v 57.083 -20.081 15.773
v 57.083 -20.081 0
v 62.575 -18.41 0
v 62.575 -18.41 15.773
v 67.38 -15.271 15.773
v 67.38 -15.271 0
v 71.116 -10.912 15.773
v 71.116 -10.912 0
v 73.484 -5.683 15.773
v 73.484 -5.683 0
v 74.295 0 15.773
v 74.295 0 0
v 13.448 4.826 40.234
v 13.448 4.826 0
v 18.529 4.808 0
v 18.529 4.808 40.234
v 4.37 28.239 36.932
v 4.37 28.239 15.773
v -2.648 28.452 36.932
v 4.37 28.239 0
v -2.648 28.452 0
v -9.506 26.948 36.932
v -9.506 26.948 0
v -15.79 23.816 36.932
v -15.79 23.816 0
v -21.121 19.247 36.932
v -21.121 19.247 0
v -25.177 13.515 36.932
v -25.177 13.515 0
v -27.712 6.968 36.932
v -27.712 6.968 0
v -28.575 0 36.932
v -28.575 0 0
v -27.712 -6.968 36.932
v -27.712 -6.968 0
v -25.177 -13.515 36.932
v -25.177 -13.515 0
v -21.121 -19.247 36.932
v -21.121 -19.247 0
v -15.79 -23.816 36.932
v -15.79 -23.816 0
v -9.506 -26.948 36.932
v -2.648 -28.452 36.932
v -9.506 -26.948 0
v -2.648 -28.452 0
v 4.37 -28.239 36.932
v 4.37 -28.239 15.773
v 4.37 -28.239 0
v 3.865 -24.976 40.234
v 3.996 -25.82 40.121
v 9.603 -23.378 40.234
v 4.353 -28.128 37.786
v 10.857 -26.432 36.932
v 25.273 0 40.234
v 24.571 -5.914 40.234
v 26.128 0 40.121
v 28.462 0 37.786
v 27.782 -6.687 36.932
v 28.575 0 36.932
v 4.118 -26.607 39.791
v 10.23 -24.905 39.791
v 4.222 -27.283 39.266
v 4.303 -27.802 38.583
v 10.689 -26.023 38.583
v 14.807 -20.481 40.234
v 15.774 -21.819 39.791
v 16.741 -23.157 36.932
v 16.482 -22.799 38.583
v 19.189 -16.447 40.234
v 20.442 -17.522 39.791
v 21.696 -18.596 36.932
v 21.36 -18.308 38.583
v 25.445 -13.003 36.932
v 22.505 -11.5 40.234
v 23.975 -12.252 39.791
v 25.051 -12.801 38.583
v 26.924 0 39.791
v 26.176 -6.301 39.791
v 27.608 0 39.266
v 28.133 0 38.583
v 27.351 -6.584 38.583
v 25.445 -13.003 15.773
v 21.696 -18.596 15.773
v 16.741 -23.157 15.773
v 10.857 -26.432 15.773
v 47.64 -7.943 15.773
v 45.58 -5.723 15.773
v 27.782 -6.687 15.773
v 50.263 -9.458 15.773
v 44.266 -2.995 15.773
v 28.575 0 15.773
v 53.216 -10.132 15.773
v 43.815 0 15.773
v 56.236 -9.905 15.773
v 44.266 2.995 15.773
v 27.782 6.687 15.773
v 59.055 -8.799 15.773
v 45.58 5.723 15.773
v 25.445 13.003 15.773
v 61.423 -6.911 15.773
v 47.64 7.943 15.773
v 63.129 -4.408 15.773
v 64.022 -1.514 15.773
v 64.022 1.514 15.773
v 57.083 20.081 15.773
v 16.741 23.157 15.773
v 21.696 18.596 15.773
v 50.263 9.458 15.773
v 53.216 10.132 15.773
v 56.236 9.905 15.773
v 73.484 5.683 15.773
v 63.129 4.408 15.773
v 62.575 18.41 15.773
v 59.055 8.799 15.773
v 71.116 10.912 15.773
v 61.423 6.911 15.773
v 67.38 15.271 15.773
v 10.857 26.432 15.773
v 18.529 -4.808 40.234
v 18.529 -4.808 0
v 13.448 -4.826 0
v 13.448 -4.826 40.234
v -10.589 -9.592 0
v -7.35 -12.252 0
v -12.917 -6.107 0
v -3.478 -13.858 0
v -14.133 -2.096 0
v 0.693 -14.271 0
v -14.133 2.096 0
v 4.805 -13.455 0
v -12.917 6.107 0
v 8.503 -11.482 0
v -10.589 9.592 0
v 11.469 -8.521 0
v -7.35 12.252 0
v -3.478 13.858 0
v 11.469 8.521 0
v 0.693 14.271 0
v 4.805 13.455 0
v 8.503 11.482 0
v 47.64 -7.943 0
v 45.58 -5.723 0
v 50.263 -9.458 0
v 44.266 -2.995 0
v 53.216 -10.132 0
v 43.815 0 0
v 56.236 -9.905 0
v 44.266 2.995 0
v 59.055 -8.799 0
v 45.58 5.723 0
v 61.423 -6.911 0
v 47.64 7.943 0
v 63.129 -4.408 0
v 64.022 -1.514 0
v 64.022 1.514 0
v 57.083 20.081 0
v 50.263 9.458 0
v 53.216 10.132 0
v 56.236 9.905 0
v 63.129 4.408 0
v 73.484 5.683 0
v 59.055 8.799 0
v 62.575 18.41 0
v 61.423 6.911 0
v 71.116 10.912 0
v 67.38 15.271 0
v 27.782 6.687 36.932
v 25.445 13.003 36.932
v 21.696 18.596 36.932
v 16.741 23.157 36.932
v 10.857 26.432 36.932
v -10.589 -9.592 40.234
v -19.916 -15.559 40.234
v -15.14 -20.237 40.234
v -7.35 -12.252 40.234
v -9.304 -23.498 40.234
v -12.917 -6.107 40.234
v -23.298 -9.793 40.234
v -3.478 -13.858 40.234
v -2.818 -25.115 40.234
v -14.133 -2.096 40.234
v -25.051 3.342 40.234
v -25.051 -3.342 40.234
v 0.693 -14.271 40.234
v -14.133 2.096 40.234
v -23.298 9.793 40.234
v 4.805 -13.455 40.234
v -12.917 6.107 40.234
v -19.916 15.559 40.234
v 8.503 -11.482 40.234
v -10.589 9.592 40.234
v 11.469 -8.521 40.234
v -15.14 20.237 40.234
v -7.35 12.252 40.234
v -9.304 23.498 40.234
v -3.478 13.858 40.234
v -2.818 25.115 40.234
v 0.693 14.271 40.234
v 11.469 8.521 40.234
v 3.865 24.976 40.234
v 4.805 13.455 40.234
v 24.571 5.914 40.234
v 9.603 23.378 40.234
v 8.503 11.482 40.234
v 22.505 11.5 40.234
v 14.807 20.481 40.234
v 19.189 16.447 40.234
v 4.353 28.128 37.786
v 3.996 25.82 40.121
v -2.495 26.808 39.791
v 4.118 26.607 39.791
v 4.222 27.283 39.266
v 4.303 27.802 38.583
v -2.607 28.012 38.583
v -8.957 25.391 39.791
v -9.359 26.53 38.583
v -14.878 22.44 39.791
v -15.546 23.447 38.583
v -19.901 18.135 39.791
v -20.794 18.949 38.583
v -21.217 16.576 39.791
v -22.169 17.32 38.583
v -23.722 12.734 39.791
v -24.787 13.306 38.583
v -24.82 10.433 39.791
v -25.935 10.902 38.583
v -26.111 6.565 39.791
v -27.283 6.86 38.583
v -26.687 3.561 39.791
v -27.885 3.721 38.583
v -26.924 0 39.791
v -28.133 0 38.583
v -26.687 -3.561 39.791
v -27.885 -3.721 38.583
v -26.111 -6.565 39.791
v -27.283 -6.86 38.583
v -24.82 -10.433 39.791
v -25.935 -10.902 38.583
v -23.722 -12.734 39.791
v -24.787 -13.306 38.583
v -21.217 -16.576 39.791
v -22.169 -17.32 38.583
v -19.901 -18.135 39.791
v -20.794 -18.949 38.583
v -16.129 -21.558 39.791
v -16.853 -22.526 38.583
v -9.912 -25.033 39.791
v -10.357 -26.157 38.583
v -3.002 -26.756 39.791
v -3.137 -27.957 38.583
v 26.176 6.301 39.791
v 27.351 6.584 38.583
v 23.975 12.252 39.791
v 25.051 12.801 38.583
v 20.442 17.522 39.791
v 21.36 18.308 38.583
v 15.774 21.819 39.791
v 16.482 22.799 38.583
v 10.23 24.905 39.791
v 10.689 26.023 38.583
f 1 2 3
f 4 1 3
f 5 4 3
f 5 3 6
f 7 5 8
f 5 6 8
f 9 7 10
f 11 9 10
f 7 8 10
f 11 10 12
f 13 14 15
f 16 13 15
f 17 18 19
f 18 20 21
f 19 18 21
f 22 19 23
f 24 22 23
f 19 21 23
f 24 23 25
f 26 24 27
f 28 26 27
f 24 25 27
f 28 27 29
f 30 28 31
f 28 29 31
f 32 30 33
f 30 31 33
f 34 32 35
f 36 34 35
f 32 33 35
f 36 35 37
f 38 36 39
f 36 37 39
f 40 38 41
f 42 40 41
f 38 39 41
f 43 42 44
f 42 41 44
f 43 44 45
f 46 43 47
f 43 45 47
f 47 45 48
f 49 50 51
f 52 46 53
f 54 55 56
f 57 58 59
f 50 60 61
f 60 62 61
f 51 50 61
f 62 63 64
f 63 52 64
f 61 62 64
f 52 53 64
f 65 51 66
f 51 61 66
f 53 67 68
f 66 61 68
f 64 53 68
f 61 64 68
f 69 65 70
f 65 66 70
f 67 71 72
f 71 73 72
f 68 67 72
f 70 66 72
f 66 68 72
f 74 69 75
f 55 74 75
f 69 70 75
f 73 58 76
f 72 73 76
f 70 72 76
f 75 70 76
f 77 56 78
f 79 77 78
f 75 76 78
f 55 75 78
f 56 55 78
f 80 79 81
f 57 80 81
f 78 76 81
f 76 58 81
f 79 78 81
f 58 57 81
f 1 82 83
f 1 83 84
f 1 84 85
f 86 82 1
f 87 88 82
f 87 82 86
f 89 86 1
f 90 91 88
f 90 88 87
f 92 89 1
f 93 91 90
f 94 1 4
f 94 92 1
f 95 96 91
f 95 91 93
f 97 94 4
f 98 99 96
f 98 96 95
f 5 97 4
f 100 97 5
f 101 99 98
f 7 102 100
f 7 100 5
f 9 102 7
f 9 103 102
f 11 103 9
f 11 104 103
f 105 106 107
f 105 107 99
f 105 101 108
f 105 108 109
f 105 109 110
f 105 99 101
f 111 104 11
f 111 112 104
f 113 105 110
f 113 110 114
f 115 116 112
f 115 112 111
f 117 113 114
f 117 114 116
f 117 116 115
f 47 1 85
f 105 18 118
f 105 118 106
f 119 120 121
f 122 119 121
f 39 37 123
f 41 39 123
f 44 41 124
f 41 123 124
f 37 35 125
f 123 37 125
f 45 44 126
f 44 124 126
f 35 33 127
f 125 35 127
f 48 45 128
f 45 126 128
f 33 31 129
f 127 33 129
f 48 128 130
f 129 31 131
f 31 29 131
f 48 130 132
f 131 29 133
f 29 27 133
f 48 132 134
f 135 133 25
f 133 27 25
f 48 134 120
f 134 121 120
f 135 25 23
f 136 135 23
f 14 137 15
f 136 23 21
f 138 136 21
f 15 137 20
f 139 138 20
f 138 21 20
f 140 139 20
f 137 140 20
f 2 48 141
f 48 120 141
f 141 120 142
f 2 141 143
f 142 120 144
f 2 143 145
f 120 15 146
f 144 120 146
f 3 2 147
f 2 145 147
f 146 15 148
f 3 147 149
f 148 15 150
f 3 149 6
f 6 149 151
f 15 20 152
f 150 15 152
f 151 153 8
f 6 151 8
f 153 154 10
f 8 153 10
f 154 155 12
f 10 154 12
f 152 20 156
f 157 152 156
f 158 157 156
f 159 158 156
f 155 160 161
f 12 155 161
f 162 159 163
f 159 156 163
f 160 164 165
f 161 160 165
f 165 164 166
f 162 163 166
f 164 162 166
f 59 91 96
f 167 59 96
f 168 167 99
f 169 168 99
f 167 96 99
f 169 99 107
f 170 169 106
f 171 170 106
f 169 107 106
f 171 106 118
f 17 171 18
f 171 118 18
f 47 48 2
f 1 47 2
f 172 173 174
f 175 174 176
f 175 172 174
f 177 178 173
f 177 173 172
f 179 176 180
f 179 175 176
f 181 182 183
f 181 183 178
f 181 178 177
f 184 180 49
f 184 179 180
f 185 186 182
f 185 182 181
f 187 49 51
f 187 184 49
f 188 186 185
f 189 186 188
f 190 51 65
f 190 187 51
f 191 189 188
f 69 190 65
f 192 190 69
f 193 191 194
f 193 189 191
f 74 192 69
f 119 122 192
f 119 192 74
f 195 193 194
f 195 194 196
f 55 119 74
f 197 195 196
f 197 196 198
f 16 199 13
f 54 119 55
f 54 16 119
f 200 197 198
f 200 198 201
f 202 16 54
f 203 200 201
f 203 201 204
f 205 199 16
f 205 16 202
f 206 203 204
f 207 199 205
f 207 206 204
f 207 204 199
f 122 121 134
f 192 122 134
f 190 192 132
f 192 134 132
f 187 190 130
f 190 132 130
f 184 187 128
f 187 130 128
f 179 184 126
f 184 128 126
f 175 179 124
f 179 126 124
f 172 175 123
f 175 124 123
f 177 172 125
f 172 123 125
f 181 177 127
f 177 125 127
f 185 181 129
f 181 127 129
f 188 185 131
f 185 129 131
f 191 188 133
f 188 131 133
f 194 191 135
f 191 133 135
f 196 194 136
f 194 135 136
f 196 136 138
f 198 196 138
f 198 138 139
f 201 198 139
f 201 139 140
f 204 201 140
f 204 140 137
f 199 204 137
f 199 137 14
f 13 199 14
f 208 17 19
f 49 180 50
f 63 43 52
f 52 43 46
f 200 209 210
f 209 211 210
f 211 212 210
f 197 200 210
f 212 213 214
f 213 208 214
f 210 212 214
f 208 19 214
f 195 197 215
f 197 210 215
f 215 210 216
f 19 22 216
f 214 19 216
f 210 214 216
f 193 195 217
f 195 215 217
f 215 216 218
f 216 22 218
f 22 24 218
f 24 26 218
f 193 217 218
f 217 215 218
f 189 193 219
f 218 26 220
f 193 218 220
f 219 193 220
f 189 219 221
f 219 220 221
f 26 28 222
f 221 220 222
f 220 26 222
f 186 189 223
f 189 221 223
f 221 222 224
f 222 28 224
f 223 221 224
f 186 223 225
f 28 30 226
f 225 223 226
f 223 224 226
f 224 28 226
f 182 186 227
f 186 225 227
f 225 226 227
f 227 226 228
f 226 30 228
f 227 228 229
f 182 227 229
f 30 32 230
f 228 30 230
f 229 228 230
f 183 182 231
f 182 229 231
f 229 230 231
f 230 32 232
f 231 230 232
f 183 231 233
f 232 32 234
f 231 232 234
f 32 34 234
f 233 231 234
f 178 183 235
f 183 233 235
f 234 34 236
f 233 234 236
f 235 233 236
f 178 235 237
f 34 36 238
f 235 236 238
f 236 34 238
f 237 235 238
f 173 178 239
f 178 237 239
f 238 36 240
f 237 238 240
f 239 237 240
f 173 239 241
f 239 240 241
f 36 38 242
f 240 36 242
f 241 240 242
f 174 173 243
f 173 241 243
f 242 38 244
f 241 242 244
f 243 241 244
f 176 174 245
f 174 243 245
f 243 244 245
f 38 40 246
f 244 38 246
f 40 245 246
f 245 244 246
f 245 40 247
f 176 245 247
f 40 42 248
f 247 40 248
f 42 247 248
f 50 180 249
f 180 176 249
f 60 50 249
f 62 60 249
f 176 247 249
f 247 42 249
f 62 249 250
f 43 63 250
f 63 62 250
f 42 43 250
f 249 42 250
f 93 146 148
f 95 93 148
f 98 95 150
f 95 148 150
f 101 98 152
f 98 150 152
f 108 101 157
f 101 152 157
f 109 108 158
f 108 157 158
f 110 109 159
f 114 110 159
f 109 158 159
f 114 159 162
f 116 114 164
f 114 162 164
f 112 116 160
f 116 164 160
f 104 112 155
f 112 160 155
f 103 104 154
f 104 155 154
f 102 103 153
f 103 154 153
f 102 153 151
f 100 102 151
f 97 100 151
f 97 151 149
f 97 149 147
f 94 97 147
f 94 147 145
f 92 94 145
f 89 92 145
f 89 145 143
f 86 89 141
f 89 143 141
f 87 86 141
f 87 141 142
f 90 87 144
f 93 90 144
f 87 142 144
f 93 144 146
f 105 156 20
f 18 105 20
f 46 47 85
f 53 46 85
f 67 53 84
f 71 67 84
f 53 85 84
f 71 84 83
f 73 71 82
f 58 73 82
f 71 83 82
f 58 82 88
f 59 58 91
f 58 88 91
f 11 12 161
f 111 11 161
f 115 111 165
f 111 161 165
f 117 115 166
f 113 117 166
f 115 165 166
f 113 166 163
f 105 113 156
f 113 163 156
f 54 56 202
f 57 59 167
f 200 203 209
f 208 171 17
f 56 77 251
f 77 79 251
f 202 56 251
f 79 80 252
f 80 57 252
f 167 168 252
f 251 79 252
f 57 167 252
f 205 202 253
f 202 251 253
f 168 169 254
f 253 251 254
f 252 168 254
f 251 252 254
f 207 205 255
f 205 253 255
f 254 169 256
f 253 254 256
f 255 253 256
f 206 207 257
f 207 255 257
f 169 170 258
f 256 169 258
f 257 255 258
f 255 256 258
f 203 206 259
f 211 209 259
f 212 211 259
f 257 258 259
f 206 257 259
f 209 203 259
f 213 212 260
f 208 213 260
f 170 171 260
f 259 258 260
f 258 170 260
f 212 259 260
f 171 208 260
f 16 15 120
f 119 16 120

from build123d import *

# Parameters (mm, degrees)
F1_DEPTH = 15.7734
F2_DEPTH = 40.2336
F3_R     = 3.302


with BuildPart() as f1:
    # F0 (on Top) → F1 (new body)
    with BuildSketch(Plane.XY):
        with BuildLine():
            ThreePointArc((4.370294, 28.238824), (21.695757, 18.596363), (28.575, 0))
            Line((28.575, 0), (33.655, 0))
            ThreePointArc((33.655, 0), (40.750919, 15.428094), (57.082765, 20.080941))
            Line((57.082765, 20.080941), (4.370294, 28.238824))
        make_face()
        with BuildLine():
            Line((33.655, 0), (28.575, 0))
            ThreePointArc((28.575, 0), (21.695757, -18.596363), (4.370294, -28.238824))
            Line((4.370294, -28.238824), (57.082765, -20.080941))
            ThreePointArc((57.082765, -20.080941), (40.750919, -15.428094), (33.655, 0))
        make_face()
        with BuildLine():
            ThreePointArc((57.082765, 20.080941), (40.750919, 15.428094), (33.655, 0))
            ThreePointArc((33.655, 0), (40.750919, -15.428094), (57.082765, -20.080941))
            ThreePointArc((57.082765, -20.080941), (69.403094, -13.224081), (74.295, 0))
            ThreePointArc((74.295, 0), (69.403094, 13.224081), (57.082765, 20.080941))
        make_face()
        with BuildLine():
            ThreePointArc((64.135, 0), (53.975, -10.16), (43.815, 0))
            ThreePointArc((43.815, 0), (53.975, 10.16), (64.135, 0))
        make_face(mode=Mode.SUBTRACT)
    extrude(amount=F1_DEPTH)

    # F0 (on Top) → F2 (join)
    with BuildSketch(Plane.XY):
        with BuildLine():
            ThreePointArc((4.370294, -28.238824), (21.695757, -18.596363), (28.575, 0))
            ThreePointArc((28.575, 0), (21.695757, 18.596363), (4.370294, 28.238824))
            ThreePointArc((4.370294, 28.238824), (-28.575, 0), (4.370294, -28.238824))
        make_face()
        with BuildLine():
            ThreePointArc((13.447765, -4.826), (-14.2875, 0), (13.447765, 4.826))
            Line((13.447765, 4.826), (18.5293, 4.807771))
            Line((18.5293, 4.807771), (18.5293, 0))
            Line((18.5293, 0), (18.5293, -4.807771))
            Line((18.5293, -4.807771), (13.447765, -4.826))
        make_face(mode=Mode.SUBTRACT)
    extrude(amount=F2_DEPTH)

    # F3
    f3_edges = [f1.edges().sort_by_distance(p)[0] for p in [
        (-4.370294, 28.238824, 40.2336),
    ]]
    fillet(f3_edges, radius=F3_R)


solid = f1.part
